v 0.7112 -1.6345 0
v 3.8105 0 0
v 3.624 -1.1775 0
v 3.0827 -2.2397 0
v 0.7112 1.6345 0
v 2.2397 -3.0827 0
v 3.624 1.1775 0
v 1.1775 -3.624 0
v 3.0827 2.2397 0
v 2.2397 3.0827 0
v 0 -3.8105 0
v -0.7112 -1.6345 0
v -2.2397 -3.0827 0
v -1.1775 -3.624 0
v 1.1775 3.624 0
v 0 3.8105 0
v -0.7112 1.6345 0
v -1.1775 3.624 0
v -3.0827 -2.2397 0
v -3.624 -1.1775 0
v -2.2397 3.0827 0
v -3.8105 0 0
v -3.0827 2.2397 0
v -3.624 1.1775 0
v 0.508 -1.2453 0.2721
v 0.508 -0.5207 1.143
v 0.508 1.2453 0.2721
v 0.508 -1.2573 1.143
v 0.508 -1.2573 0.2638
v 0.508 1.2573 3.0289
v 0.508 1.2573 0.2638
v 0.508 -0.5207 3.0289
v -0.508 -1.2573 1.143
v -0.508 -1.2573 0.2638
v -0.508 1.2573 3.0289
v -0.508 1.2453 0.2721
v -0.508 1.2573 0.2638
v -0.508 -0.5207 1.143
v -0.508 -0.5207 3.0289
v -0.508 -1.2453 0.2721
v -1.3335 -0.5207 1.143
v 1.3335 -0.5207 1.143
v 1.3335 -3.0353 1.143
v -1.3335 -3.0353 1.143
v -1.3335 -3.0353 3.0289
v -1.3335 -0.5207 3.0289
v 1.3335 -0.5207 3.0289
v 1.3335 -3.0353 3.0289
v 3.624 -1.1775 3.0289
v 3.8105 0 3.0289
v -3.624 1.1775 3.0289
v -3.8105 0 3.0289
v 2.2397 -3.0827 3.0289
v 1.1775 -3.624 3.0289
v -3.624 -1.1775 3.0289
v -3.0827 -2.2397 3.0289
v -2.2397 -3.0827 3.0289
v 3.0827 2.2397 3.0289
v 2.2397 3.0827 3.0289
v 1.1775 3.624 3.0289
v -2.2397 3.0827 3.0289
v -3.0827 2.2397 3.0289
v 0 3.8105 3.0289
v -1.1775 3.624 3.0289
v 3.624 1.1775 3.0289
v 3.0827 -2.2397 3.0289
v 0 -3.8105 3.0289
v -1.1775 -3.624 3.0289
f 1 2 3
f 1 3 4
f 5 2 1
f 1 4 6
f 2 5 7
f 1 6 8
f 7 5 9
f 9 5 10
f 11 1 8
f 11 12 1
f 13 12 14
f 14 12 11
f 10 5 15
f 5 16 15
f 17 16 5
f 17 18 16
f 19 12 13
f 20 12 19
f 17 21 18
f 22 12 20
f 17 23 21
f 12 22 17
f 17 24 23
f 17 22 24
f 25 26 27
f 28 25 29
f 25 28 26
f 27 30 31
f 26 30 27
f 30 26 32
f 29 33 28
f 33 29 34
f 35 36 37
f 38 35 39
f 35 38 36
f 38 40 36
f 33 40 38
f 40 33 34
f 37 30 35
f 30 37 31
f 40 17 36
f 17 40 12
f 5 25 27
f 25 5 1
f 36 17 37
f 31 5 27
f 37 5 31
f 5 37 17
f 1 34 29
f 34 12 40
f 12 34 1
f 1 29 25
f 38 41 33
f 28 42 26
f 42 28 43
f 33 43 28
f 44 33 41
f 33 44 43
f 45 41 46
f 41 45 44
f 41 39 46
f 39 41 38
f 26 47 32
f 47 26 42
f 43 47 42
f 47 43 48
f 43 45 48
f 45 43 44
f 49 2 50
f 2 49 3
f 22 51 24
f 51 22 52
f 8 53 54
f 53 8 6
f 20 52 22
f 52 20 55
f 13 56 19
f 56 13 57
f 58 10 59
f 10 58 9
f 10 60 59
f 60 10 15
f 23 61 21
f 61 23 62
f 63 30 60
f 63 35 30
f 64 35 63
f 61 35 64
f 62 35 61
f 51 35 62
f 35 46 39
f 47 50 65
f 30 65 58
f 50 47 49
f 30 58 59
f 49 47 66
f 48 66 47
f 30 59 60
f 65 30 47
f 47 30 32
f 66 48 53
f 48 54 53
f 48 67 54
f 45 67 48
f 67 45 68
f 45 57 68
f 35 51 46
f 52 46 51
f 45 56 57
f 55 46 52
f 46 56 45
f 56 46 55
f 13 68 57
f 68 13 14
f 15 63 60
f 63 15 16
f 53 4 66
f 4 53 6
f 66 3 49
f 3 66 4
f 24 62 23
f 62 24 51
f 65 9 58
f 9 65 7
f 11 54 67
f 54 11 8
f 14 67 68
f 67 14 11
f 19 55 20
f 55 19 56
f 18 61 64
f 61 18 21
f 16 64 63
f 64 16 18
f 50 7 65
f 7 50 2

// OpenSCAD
//Adjust these to fit your magnets. Dimension is mm (25.4 is the conversion from inches)
magnetLength = 0.105*25.4;//how long it is axially
magnetWidth  = 0.099*25.4;//diameter
magnetOffset = 0.07*25.4;

//Tweak pegWidth to fit on your stickboxes. This will need to be adjusted according to your printer.
// Note that the two different pegs fit differently.
//pegWidth = 0.038*25.4;//this was enough with nothing over it but now it's too tight
pegWidth = 0.040*25.4;
pegHeight = 0.099*25.4;//0.085 was very hard to put on

//don't change these
magnetDiagonal = sqrt(magnetLength^2+magnetWidth^2)+magnetOffset;
magnetLengthScaled = magnetLength*1.05;//to make it not interfere when press-fitting

pegLength = 0.045*25.4;

dia = max(max(0.2*25.4, magnetDiagonal*1.4), magnetDiagonal+0.058*25.4);
height = pegLength+0.75*magnetWidth;

difference() {
    linear_extrude(height) {
        circle(d=dia, $fn=20);
    }
    union() {
        linear_extrude(height*3) {
            square([pegWidth, pegHeight], center=true);
            square([pegWidth, magnetWidth], center=true);
        }
        linear_extrude(pegLength*.5, scale=[0.4, 0.5]) {
            square([pegWidth*1.4, pegHeight*1.3], center=true);
        }
        translate([0, -magnetOffset, pegLength]) {
            linear_extrude(height, scale=[1.0, 1.0]) {
                square([magnetLength, magnetWidth], center=true);
            }
        }
        translate([0, 0, pegLength]) {
            linear_extrude(height) {
                //square([dia*1.1, 1], center=true);
            }
        }
    }
}
